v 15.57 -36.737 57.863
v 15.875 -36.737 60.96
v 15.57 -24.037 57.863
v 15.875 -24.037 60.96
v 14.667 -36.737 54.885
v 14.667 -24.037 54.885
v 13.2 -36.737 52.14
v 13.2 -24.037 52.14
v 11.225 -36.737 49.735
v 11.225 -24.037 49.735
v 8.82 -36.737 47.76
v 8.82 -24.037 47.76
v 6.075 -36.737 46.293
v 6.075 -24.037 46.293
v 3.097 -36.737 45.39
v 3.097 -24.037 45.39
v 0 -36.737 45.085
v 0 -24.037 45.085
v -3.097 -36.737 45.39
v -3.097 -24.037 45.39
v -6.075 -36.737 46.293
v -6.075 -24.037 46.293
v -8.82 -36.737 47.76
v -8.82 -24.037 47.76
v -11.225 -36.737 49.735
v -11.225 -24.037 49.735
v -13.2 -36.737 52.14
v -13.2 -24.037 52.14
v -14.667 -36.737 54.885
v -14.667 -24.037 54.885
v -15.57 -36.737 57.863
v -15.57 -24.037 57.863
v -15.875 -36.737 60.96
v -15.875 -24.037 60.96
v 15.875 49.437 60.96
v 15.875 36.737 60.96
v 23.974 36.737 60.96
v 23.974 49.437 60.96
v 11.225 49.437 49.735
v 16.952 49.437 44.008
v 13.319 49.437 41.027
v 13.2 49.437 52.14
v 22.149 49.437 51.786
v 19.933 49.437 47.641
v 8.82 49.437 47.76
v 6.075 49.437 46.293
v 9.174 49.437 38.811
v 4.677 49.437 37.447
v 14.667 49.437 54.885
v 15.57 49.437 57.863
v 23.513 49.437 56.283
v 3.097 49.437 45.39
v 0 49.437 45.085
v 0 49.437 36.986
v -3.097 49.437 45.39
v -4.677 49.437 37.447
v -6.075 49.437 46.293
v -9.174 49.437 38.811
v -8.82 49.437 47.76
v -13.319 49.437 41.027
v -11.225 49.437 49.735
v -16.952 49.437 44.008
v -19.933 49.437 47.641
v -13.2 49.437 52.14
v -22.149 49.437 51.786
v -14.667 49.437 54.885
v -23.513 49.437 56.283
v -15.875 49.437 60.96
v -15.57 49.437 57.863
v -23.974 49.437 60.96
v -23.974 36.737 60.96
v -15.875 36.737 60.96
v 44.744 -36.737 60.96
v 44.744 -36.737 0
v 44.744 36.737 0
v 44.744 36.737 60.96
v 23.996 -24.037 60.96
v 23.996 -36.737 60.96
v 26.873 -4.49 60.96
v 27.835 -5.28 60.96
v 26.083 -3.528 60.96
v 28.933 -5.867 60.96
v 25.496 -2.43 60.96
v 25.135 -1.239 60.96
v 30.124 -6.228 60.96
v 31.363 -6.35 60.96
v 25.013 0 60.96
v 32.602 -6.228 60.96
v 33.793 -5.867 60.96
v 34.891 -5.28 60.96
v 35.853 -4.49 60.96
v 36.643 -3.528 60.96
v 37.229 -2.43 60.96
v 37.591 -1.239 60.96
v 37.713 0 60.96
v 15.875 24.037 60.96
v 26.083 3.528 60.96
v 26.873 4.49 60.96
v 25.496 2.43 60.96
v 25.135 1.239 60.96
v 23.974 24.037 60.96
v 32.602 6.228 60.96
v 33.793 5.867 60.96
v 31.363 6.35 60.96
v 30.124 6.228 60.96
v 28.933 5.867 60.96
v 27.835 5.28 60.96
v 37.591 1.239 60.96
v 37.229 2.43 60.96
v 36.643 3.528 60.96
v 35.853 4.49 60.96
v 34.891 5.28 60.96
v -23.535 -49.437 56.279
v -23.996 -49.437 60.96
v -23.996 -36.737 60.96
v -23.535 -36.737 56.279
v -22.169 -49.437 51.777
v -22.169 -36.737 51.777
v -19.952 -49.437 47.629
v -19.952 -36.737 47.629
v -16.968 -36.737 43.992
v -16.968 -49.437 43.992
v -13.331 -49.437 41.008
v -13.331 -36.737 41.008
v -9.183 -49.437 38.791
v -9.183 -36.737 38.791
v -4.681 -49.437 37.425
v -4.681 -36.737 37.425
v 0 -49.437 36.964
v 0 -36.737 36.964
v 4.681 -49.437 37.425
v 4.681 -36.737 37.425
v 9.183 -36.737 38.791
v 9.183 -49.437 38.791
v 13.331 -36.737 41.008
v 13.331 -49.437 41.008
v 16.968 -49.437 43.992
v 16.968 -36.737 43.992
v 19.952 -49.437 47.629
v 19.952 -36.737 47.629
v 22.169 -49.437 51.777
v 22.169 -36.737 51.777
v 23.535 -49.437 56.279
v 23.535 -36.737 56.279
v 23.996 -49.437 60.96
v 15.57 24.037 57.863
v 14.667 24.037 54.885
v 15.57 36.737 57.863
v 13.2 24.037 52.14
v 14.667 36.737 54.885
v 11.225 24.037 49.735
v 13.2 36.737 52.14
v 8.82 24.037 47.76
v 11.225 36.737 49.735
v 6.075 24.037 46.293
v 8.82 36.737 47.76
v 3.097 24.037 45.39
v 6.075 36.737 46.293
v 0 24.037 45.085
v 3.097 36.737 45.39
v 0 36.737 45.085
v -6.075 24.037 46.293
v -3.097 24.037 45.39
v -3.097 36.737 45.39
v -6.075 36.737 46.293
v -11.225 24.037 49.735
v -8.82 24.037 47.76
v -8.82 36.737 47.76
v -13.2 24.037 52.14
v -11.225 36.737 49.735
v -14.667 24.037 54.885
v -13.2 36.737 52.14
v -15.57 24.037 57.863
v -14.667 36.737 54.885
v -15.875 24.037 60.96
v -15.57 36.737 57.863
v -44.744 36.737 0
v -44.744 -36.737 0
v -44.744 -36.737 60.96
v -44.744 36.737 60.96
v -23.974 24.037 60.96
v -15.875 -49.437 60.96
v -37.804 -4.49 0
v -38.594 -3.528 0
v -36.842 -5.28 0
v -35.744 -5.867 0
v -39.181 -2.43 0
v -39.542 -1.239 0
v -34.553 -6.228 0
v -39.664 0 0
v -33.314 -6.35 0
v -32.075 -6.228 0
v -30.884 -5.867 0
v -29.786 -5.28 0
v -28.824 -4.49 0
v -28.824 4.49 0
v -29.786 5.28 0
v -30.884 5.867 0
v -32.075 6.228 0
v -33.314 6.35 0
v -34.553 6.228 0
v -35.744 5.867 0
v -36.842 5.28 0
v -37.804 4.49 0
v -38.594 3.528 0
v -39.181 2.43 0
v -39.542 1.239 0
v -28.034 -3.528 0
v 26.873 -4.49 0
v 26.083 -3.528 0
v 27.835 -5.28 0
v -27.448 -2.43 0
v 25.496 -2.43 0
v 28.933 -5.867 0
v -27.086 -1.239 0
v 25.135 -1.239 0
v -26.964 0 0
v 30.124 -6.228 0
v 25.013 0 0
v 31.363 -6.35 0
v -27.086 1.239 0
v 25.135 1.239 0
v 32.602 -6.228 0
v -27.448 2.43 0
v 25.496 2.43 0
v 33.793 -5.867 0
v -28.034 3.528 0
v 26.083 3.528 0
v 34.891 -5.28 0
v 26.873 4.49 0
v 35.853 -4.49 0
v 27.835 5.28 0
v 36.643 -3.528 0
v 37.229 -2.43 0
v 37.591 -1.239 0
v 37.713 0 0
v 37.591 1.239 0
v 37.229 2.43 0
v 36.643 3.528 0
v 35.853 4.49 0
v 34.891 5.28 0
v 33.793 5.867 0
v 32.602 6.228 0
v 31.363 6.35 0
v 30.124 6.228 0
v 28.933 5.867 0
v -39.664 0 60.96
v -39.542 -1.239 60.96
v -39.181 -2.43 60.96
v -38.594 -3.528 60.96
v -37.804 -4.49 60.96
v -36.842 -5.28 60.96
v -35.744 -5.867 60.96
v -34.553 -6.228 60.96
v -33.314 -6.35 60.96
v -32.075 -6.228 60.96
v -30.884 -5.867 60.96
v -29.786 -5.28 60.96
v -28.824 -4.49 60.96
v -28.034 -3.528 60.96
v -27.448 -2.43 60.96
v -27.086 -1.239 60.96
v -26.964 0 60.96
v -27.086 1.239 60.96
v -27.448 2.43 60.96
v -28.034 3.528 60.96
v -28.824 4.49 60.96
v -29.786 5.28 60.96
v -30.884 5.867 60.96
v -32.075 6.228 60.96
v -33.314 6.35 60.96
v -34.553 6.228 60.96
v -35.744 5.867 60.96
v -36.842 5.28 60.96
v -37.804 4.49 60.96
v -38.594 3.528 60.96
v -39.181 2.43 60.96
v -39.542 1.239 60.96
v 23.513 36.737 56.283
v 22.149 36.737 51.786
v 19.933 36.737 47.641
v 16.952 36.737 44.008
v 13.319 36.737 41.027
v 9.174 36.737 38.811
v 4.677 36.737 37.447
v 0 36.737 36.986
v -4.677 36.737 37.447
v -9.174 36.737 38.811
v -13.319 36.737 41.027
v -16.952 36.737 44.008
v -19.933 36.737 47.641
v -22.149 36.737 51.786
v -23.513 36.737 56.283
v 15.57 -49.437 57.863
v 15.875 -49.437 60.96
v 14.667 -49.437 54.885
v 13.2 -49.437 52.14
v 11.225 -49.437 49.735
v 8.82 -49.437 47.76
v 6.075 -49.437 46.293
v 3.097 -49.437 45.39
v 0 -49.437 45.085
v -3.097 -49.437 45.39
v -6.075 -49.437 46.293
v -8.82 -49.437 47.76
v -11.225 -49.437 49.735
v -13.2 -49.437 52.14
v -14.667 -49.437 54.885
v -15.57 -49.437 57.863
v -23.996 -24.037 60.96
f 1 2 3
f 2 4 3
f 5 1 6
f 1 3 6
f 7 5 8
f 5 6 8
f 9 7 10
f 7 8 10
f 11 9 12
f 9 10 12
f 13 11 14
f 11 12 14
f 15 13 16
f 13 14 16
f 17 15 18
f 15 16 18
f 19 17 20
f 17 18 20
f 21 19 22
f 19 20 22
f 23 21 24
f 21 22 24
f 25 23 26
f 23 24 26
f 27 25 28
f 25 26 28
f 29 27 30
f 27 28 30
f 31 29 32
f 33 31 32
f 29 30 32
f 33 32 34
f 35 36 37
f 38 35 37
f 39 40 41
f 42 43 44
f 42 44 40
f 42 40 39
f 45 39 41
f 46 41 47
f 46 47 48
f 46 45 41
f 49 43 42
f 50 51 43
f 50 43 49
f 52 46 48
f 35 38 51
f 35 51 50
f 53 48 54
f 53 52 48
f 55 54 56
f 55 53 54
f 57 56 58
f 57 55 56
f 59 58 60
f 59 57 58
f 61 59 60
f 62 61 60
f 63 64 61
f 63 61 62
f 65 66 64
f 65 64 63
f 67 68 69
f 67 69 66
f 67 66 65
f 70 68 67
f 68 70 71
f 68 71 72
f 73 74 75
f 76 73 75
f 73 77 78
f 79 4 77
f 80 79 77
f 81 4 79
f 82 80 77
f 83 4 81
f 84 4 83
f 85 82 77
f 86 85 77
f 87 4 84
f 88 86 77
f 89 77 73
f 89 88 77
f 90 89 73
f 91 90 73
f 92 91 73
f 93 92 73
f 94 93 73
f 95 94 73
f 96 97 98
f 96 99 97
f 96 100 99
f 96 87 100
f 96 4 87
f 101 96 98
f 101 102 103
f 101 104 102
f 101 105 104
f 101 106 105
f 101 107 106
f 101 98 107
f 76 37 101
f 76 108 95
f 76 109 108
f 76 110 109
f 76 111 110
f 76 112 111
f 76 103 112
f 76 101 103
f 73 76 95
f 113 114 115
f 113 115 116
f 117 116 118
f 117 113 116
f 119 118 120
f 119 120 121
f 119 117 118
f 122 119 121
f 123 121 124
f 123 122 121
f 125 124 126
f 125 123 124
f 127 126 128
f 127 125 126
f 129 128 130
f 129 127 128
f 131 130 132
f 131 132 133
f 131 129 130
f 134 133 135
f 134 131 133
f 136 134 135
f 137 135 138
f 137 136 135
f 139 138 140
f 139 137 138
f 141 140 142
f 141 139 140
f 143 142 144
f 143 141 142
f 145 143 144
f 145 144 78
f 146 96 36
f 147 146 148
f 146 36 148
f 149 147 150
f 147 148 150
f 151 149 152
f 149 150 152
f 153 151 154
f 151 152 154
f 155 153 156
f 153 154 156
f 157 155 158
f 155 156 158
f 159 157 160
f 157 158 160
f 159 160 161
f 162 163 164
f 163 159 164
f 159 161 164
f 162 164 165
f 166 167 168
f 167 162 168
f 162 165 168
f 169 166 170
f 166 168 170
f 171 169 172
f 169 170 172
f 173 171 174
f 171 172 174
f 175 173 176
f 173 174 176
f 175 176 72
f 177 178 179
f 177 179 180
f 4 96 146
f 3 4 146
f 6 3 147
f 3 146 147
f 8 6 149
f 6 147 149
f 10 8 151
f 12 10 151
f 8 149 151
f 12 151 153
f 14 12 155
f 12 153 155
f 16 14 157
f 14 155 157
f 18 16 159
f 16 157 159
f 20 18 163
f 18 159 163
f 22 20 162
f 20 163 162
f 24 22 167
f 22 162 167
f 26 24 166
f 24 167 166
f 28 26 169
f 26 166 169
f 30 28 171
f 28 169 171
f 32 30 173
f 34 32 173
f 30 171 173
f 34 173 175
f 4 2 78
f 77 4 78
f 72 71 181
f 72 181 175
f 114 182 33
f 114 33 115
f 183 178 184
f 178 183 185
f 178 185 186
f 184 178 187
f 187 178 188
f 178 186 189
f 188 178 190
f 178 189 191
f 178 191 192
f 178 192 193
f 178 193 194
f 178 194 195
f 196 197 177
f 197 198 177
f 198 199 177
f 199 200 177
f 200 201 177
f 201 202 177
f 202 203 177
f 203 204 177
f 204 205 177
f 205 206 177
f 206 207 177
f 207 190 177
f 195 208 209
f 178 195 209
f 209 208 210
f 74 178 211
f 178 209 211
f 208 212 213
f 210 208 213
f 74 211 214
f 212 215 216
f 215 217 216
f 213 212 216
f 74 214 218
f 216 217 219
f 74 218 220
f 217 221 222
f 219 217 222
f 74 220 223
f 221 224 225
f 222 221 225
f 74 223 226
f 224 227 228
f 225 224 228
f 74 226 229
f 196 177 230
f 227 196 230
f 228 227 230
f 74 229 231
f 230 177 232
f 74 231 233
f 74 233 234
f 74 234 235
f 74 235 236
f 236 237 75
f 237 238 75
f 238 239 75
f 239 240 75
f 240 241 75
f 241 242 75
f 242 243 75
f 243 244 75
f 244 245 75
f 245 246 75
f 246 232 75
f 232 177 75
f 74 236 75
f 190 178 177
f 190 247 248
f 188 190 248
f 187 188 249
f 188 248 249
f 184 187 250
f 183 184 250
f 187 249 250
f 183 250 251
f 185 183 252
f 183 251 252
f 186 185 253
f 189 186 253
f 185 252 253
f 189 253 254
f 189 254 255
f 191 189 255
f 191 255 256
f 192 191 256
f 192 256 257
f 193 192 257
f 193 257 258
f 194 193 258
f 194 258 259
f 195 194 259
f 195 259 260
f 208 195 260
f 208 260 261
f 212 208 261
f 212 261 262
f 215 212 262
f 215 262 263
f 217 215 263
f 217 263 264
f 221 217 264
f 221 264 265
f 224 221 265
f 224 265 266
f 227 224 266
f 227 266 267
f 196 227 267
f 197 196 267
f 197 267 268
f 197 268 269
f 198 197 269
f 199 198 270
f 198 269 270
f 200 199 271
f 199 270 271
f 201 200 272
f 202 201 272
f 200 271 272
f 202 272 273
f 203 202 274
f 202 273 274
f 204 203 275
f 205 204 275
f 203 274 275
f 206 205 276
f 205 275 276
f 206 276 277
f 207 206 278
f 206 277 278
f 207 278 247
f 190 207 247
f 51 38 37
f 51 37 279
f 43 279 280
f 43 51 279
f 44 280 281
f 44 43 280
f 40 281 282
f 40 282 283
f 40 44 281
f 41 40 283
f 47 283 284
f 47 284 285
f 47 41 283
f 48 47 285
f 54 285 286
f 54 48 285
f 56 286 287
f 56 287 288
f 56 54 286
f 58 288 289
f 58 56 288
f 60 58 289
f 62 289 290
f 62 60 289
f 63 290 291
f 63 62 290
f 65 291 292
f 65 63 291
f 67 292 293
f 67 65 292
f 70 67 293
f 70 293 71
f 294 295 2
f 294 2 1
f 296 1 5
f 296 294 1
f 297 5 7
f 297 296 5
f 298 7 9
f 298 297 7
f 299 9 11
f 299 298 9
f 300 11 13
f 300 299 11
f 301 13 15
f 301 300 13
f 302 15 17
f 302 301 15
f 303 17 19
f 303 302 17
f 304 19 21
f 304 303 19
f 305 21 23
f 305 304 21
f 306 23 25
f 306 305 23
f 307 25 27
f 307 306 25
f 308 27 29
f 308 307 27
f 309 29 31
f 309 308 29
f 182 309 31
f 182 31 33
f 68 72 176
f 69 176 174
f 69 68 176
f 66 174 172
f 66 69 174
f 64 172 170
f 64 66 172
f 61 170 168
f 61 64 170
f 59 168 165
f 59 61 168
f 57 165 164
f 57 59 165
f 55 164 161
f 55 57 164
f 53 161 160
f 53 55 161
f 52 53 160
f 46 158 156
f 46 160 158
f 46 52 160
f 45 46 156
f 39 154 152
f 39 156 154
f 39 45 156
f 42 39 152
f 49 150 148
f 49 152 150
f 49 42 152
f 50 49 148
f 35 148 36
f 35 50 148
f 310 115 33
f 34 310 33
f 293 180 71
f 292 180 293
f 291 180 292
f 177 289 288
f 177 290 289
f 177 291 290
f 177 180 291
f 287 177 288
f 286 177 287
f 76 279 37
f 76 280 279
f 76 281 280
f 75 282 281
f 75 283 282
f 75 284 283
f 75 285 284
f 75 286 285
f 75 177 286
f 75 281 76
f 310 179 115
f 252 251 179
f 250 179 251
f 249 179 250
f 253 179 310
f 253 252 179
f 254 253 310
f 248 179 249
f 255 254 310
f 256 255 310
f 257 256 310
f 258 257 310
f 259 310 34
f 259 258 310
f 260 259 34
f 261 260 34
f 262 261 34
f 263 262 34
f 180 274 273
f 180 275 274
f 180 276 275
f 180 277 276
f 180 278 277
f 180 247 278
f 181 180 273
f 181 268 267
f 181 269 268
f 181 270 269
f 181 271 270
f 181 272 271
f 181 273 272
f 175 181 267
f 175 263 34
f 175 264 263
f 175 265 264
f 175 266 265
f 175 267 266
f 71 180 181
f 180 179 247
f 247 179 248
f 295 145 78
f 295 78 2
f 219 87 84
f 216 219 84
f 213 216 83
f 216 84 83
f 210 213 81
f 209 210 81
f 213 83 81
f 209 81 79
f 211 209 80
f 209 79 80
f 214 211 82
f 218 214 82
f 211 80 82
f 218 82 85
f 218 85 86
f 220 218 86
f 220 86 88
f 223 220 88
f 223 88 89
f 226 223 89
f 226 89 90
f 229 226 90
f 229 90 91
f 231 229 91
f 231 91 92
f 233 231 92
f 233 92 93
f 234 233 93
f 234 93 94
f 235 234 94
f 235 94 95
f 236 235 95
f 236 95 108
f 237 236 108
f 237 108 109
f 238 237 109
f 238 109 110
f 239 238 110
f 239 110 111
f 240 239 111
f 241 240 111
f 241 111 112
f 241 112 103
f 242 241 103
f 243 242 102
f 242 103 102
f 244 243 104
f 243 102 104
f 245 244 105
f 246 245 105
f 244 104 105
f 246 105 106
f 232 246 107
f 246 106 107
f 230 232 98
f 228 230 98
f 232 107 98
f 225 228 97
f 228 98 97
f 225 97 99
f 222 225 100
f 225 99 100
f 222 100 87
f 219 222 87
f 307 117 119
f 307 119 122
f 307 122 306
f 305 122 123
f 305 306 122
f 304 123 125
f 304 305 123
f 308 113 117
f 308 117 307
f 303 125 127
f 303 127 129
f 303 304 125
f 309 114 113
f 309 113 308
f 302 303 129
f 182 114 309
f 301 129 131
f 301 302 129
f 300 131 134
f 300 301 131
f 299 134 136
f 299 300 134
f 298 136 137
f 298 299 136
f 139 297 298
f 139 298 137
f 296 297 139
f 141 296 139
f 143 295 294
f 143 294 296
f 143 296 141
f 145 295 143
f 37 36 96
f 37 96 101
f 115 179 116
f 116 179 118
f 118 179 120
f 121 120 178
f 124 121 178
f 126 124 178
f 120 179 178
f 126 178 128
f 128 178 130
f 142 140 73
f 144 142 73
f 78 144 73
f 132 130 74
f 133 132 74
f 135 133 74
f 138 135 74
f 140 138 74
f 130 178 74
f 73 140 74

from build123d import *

# Parameters (mm, degrees)
F0_W     = 89.4885361195
F0_H     = 73.4741464257
F1_DEPTH = 60.96
F3_D     = 12.7
F5_D     = 31.75
F7_DEPTH = 12.7
F9_DEPTH = 12.7


with BuildPart() as f1:
    # F0 (on Top) → F1 (new body)
    with BuildSketch(Plane.XY):
        Rectangle(F0_W, F0_H)
    extrude(amount=F1_DEPTH)

    # F3 (through all)
    with Locations(Plane(origin=(0, 0, 0), x_dir=(1, 0, 0), z_dir=(0, 0, -1))):
        with Locations((-33.3142690361, 0), (31.3628092408, 0)):
            Hole(F3_D / 2)

    # F5 (through all)
    with Locations(Plane.XZ.offset(36.7370732129)):
        with Locations((0, 60.96)):
            Hole(F5_D / 2)

    # F6 (on face) → F7 (join, symmetric)
    with BuildSketch(Plane.XZ.offset(36.7370732129)):
        with BuildLine():
            Line((-15.875, 60.96), (-23.9956887367, 60.96))
            ThreePointArc((-23.9956887367, 60.96), (0, 36.9643112633), (23.9956887367, 60.96))
            Line((23.9956887367, 60.96), (15.875, 60.96))
            ThreePointArc((15.875, 60.96), (0, 45.085), (-15.875, 60.96))
        make_face()
    extrude(amount=F7_DEPTH, both=True)

    # F8 (on face) → F9 (join, symmetric)
    with BuildSketch(Plane(origin=(0, 36.7370732129, 0), x_dir=(-1, 0, 0), z_dir=(0, 1, 0))):
        with BuildLine():
            Line((-15.875, 60.96), (-23.9735442009, 60.96))
            ThreePointArc((-23.9735442009, 60.96), (0, 36.9864557991), (23.9735442009, 60.96))
            Line((23.9735442009, 60.96), (15.875, 60.96))
            ThreePointArc((15.875, 60.96), (0, 45.085), (-15.875, 60.96))
        make_face()
    extrude(amount=F9_DEPTH, both=True)


solid = f1.part
